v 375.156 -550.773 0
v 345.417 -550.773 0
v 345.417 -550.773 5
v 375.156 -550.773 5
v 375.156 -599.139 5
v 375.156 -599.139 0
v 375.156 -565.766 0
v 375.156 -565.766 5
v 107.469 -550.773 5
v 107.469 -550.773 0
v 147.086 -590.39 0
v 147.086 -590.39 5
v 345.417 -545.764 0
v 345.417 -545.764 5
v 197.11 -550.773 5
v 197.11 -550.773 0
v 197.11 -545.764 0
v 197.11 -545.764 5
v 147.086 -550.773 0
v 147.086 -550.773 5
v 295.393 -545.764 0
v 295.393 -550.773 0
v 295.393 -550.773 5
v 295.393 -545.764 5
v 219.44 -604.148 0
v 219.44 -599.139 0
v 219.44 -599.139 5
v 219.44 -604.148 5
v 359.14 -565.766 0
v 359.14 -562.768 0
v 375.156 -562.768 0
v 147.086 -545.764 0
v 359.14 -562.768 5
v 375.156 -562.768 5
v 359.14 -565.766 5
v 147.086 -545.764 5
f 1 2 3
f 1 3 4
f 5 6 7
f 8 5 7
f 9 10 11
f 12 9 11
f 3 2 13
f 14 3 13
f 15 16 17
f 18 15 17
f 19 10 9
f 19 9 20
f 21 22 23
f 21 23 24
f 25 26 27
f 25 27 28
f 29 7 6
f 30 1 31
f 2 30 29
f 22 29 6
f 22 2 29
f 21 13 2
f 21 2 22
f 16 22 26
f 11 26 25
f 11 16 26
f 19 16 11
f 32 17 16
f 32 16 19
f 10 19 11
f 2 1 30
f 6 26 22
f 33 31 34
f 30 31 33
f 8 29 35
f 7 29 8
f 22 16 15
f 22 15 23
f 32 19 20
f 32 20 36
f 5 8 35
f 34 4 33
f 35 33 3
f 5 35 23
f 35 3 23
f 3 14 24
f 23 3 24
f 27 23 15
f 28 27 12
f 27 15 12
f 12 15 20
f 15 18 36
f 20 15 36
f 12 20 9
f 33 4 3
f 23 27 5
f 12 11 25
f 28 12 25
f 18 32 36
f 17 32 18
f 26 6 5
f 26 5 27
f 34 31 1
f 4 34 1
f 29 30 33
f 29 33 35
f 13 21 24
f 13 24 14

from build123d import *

# Parameters (mm, degrees)
PAD008_DEPTH = 5


with BuildPart() as part:
    # Sketch009 → Pad008 (new body)
    with BuildSketch(Plane.XY):
        with BuildLine():
            add(Edge.make_bspline(
                [(107.468718, -550.773208), (147.085661, -550.773208)],
                knots=[0, 0, 112.3, 112.3], degree=1))
            add(Edge.make_bspline(
                [(147.085661, -550.773208), (147.085661, -545.763764)],
                knots=[0, 0, 14.2, 14.2], degree=1))
            add(Edge.make_bspline(
                [(147.085661, -545.763764), (197.109549, -545.763764)],
                knots=[0, 0, 141.8, 141.8], degree=1))
            add(Edge.make_bspline(
                [(197.109549, -550.773208), (197.109549, -545.763764)],
                knots=[0, 0, 14.2, 14.2], degree=1))
            add(Edge.make_bspline(
                [(197.109549, -550.773208), (295.393436, -550.773208)],
                knots=[0, 0, 278.6, 278.6], degree=1))
            add(Edge.make_bspline(
                [(295.393436, -550.773208), (295.393436, -545.763764)],
                knots=[0, 0, 14.2, 14.2], degree=1))
            add(Edge.make_bspline(
                [(295.393436, -545.763764), (345.417324, -545.763764)],
                knots=[0, 0, 141.8, 141.8], degree=1))
            add(Edge.make_bspline(
                [(345.417324, -550.773208), (345.417324, -545.763764)],
                knots=[0, 0, 14.2, 14.2], degree=1))
            add(Edge.make_bspline(
                [(345.417324, -550.773208), (375.15649, -550.773208)],
                knots=[0, 0, 84.3, 84.3], degree=1))
            add(Edge.make_bspline(
                [(375.15649, -562.767652), (375.15649, -550.773208)],
                knots=[0, 0, 34, 34], degree=1))
            add(Edge.make_bspline(
                [(375.15649, -562.767652), (359.140379, -562.767652)],
                knots=[0, 0, 45.4, 45.4], degree=1))
            add(Edge.make_bspline(
                [(359.140379, -562.767652), (359.140379, -565.766263)],
                knots=[0, 0, 8.5, 8.5], degree=1))
            add(Edge.make_bspline(
                [(359.140379, -565.766263), (375.15649, -565.766263)],
                knots=[0, 0, 45.4, 45.4], degree=1))
            add(Edge.make_bspline(
                [(375.15649, -599.13904), (375.15649, -565.766263)],
                knots=[0, 0, 94.6, 94.6], degree=1))
            add(Edge.make_bspline(
                [(375.15649, -599.13904), (219.440382, -599.13904)],
                knots=[0, 0, 441.4, 441.4], degree=1))
            add(Edge.make_bspline(
                [(219.440382, -599.13904), (219.440382, -604.148485)],
                knots=[0, 0, 14.2, 14.2], degree=1))
            add(Edge.make_bspline(
                [(147.085661, -590.390151), (219.440382, -604.148485)],
                knots=[0, 0, 208.775022, 208.775022], degree=1))
            add(Edge.make_bspline(
                [(107.468718, -550.773208), (147.085661, -590.390151)],
                knots=[0, 0, 158.816183, 158.816183], degree=1))
        make_face()
    extrude(amount=PAD008_DEPTH)


solid = part.part
